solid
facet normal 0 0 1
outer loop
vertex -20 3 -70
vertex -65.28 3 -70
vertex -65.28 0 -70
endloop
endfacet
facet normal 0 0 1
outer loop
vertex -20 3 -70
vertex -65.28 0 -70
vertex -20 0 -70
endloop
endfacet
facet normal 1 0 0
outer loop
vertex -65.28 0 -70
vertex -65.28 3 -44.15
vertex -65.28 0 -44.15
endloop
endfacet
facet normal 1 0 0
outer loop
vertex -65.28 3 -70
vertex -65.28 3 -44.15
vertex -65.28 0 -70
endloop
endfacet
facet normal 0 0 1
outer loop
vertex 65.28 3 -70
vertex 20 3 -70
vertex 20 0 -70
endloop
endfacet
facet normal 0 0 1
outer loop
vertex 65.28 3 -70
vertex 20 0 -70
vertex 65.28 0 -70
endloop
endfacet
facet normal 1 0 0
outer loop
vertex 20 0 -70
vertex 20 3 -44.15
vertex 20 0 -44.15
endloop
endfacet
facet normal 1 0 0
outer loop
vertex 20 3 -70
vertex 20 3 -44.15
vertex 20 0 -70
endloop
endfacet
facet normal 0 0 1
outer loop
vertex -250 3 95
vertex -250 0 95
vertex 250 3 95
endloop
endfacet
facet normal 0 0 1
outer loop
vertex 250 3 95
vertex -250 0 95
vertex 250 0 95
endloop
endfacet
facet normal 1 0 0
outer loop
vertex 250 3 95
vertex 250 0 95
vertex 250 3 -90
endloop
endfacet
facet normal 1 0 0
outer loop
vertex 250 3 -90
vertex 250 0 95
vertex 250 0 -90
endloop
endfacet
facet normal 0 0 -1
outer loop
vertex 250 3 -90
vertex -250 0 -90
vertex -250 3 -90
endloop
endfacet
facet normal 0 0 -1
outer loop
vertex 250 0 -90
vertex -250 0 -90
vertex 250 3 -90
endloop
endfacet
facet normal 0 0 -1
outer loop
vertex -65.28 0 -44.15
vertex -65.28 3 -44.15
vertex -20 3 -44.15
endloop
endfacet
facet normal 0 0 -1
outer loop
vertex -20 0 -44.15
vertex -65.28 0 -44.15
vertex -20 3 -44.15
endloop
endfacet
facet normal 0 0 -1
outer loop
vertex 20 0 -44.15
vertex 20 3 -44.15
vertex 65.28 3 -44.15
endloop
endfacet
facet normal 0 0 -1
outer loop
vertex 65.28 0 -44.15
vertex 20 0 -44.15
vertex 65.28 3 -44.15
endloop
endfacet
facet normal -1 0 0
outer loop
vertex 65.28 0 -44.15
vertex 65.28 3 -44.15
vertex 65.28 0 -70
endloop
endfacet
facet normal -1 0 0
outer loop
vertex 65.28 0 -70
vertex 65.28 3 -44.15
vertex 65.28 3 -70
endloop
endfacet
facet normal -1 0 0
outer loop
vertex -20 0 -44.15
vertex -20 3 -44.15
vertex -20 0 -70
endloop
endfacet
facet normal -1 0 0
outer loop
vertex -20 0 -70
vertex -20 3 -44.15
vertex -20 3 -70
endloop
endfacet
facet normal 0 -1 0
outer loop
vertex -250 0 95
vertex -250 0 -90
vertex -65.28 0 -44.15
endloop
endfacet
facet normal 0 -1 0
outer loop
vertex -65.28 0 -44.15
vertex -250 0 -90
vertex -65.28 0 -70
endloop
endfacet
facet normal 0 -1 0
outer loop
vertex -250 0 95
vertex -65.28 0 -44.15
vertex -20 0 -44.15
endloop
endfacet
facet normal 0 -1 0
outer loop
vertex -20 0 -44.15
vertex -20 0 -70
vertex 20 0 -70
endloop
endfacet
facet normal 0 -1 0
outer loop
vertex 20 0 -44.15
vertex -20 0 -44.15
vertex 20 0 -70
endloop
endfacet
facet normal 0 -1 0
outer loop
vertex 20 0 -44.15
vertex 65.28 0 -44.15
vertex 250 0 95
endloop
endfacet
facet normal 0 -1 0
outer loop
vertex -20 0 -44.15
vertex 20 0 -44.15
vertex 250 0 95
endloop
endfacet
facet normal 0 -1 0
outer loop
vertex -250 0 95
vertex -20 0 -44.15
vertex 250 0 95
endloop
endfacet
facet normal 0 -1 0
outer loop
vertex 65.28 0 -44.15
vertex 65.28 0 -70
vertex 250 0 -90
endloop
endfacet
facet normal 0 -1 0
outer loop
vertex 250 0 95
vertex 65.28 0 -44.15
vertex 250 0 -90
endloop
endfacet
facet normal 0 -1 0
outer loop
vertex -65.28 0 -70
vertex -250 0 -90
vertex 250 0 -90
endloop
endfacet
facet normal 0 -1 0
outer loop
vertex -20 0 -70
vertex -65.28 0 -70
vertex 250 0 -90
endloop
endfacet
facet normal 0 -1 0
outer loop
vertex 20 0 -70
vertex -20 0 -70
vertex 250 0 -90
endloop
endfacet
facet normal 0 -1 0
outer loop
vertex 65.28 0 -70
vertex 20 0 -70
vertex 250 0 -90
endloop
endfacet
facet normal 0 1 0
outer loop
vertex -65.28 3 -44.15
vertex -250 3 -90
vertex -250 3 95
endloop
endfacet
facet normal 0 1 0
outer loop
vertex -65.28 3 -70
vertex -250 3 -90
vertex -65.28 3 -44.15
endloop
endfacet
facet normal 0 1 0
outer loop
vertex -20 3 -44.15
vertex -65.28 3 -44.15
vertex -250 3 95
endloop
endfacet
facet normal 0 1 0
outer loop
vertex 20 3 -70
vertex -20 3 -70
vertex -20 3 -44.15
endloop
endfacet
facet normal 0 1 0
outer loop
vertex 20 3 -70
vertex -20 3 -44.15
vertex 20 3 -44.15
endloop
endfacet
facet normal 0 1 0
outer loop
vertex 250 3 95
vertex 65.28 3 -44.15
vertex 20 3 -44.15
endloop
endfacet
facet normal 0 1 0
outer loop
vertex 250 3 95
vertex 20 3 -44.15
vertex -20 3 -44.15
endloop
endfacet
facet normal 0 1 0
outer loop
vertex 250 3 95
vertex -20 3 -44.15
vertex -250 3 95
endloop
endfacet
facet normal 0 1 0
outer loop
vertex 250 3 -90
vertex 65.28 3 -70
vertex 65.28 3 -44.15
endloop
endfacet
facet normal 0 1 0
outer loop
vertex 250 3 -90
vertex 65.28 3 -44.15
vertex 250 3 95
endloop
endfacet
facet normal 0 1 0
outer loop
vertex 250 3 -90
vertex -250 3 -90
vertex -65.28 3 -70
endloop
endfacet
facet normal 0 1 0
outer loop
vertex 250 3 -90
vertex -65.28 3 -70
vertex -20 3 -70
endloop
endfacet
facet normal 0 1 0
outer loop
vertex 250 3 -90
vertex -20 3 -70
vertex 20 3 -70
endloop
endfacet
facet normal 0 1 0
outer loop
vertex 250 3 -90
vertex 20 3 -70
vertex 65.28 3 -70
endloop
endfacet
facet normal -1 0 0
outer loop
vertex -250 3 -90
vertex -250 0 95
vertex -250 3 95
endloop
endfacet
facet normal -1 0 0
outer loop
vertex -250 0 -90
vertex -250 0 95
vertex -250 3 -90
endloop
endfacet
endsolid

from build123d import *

# Parameters (mm, degrees)
SKETCH1_W           = 500
SKETCH1_H           = 185
BOSS_EXTRUDE1_DEPTH = 3
SKETCH2_W           = 45.28
SKETCH2_H           = 25.85
CUT_EXTRUDE1_DEPTH  = 3


with BuildPart() as part:
    # Sketch1 → Boss-Extrude1 (new body)
    with BuildSketch(Plane(origin=(0, 0, 0), x_dir=(1, 0, 0), z_dir=(0, 1, 0))):
        with Locations((0, -2.5)):
            Rectangle(SKETCH1_W, SKETCH1_H)
    extrude(amount=BOSS_EXTRUDE1_DEPTH)

    # Sketch2 → Cut-Extrude1 (cut)
    with BuildSketch(Plane(origin=(0, 3, 0), x_dir=(1, 0, 0), z_dir=(0, 1, 0))):
        with Locations((-42.64, 57.075)):
            Rectangle(SKETCH2_W, SKETCH2_H)
        with Locations((42.64, 57.075)):
            Rectangle(SKETCH2_W, SKETCH2_H)
    extrude(amount=-CUT_EXTRUDE1_DEPTH, mode=Mode.SUBTRACT)


solid = part.part
